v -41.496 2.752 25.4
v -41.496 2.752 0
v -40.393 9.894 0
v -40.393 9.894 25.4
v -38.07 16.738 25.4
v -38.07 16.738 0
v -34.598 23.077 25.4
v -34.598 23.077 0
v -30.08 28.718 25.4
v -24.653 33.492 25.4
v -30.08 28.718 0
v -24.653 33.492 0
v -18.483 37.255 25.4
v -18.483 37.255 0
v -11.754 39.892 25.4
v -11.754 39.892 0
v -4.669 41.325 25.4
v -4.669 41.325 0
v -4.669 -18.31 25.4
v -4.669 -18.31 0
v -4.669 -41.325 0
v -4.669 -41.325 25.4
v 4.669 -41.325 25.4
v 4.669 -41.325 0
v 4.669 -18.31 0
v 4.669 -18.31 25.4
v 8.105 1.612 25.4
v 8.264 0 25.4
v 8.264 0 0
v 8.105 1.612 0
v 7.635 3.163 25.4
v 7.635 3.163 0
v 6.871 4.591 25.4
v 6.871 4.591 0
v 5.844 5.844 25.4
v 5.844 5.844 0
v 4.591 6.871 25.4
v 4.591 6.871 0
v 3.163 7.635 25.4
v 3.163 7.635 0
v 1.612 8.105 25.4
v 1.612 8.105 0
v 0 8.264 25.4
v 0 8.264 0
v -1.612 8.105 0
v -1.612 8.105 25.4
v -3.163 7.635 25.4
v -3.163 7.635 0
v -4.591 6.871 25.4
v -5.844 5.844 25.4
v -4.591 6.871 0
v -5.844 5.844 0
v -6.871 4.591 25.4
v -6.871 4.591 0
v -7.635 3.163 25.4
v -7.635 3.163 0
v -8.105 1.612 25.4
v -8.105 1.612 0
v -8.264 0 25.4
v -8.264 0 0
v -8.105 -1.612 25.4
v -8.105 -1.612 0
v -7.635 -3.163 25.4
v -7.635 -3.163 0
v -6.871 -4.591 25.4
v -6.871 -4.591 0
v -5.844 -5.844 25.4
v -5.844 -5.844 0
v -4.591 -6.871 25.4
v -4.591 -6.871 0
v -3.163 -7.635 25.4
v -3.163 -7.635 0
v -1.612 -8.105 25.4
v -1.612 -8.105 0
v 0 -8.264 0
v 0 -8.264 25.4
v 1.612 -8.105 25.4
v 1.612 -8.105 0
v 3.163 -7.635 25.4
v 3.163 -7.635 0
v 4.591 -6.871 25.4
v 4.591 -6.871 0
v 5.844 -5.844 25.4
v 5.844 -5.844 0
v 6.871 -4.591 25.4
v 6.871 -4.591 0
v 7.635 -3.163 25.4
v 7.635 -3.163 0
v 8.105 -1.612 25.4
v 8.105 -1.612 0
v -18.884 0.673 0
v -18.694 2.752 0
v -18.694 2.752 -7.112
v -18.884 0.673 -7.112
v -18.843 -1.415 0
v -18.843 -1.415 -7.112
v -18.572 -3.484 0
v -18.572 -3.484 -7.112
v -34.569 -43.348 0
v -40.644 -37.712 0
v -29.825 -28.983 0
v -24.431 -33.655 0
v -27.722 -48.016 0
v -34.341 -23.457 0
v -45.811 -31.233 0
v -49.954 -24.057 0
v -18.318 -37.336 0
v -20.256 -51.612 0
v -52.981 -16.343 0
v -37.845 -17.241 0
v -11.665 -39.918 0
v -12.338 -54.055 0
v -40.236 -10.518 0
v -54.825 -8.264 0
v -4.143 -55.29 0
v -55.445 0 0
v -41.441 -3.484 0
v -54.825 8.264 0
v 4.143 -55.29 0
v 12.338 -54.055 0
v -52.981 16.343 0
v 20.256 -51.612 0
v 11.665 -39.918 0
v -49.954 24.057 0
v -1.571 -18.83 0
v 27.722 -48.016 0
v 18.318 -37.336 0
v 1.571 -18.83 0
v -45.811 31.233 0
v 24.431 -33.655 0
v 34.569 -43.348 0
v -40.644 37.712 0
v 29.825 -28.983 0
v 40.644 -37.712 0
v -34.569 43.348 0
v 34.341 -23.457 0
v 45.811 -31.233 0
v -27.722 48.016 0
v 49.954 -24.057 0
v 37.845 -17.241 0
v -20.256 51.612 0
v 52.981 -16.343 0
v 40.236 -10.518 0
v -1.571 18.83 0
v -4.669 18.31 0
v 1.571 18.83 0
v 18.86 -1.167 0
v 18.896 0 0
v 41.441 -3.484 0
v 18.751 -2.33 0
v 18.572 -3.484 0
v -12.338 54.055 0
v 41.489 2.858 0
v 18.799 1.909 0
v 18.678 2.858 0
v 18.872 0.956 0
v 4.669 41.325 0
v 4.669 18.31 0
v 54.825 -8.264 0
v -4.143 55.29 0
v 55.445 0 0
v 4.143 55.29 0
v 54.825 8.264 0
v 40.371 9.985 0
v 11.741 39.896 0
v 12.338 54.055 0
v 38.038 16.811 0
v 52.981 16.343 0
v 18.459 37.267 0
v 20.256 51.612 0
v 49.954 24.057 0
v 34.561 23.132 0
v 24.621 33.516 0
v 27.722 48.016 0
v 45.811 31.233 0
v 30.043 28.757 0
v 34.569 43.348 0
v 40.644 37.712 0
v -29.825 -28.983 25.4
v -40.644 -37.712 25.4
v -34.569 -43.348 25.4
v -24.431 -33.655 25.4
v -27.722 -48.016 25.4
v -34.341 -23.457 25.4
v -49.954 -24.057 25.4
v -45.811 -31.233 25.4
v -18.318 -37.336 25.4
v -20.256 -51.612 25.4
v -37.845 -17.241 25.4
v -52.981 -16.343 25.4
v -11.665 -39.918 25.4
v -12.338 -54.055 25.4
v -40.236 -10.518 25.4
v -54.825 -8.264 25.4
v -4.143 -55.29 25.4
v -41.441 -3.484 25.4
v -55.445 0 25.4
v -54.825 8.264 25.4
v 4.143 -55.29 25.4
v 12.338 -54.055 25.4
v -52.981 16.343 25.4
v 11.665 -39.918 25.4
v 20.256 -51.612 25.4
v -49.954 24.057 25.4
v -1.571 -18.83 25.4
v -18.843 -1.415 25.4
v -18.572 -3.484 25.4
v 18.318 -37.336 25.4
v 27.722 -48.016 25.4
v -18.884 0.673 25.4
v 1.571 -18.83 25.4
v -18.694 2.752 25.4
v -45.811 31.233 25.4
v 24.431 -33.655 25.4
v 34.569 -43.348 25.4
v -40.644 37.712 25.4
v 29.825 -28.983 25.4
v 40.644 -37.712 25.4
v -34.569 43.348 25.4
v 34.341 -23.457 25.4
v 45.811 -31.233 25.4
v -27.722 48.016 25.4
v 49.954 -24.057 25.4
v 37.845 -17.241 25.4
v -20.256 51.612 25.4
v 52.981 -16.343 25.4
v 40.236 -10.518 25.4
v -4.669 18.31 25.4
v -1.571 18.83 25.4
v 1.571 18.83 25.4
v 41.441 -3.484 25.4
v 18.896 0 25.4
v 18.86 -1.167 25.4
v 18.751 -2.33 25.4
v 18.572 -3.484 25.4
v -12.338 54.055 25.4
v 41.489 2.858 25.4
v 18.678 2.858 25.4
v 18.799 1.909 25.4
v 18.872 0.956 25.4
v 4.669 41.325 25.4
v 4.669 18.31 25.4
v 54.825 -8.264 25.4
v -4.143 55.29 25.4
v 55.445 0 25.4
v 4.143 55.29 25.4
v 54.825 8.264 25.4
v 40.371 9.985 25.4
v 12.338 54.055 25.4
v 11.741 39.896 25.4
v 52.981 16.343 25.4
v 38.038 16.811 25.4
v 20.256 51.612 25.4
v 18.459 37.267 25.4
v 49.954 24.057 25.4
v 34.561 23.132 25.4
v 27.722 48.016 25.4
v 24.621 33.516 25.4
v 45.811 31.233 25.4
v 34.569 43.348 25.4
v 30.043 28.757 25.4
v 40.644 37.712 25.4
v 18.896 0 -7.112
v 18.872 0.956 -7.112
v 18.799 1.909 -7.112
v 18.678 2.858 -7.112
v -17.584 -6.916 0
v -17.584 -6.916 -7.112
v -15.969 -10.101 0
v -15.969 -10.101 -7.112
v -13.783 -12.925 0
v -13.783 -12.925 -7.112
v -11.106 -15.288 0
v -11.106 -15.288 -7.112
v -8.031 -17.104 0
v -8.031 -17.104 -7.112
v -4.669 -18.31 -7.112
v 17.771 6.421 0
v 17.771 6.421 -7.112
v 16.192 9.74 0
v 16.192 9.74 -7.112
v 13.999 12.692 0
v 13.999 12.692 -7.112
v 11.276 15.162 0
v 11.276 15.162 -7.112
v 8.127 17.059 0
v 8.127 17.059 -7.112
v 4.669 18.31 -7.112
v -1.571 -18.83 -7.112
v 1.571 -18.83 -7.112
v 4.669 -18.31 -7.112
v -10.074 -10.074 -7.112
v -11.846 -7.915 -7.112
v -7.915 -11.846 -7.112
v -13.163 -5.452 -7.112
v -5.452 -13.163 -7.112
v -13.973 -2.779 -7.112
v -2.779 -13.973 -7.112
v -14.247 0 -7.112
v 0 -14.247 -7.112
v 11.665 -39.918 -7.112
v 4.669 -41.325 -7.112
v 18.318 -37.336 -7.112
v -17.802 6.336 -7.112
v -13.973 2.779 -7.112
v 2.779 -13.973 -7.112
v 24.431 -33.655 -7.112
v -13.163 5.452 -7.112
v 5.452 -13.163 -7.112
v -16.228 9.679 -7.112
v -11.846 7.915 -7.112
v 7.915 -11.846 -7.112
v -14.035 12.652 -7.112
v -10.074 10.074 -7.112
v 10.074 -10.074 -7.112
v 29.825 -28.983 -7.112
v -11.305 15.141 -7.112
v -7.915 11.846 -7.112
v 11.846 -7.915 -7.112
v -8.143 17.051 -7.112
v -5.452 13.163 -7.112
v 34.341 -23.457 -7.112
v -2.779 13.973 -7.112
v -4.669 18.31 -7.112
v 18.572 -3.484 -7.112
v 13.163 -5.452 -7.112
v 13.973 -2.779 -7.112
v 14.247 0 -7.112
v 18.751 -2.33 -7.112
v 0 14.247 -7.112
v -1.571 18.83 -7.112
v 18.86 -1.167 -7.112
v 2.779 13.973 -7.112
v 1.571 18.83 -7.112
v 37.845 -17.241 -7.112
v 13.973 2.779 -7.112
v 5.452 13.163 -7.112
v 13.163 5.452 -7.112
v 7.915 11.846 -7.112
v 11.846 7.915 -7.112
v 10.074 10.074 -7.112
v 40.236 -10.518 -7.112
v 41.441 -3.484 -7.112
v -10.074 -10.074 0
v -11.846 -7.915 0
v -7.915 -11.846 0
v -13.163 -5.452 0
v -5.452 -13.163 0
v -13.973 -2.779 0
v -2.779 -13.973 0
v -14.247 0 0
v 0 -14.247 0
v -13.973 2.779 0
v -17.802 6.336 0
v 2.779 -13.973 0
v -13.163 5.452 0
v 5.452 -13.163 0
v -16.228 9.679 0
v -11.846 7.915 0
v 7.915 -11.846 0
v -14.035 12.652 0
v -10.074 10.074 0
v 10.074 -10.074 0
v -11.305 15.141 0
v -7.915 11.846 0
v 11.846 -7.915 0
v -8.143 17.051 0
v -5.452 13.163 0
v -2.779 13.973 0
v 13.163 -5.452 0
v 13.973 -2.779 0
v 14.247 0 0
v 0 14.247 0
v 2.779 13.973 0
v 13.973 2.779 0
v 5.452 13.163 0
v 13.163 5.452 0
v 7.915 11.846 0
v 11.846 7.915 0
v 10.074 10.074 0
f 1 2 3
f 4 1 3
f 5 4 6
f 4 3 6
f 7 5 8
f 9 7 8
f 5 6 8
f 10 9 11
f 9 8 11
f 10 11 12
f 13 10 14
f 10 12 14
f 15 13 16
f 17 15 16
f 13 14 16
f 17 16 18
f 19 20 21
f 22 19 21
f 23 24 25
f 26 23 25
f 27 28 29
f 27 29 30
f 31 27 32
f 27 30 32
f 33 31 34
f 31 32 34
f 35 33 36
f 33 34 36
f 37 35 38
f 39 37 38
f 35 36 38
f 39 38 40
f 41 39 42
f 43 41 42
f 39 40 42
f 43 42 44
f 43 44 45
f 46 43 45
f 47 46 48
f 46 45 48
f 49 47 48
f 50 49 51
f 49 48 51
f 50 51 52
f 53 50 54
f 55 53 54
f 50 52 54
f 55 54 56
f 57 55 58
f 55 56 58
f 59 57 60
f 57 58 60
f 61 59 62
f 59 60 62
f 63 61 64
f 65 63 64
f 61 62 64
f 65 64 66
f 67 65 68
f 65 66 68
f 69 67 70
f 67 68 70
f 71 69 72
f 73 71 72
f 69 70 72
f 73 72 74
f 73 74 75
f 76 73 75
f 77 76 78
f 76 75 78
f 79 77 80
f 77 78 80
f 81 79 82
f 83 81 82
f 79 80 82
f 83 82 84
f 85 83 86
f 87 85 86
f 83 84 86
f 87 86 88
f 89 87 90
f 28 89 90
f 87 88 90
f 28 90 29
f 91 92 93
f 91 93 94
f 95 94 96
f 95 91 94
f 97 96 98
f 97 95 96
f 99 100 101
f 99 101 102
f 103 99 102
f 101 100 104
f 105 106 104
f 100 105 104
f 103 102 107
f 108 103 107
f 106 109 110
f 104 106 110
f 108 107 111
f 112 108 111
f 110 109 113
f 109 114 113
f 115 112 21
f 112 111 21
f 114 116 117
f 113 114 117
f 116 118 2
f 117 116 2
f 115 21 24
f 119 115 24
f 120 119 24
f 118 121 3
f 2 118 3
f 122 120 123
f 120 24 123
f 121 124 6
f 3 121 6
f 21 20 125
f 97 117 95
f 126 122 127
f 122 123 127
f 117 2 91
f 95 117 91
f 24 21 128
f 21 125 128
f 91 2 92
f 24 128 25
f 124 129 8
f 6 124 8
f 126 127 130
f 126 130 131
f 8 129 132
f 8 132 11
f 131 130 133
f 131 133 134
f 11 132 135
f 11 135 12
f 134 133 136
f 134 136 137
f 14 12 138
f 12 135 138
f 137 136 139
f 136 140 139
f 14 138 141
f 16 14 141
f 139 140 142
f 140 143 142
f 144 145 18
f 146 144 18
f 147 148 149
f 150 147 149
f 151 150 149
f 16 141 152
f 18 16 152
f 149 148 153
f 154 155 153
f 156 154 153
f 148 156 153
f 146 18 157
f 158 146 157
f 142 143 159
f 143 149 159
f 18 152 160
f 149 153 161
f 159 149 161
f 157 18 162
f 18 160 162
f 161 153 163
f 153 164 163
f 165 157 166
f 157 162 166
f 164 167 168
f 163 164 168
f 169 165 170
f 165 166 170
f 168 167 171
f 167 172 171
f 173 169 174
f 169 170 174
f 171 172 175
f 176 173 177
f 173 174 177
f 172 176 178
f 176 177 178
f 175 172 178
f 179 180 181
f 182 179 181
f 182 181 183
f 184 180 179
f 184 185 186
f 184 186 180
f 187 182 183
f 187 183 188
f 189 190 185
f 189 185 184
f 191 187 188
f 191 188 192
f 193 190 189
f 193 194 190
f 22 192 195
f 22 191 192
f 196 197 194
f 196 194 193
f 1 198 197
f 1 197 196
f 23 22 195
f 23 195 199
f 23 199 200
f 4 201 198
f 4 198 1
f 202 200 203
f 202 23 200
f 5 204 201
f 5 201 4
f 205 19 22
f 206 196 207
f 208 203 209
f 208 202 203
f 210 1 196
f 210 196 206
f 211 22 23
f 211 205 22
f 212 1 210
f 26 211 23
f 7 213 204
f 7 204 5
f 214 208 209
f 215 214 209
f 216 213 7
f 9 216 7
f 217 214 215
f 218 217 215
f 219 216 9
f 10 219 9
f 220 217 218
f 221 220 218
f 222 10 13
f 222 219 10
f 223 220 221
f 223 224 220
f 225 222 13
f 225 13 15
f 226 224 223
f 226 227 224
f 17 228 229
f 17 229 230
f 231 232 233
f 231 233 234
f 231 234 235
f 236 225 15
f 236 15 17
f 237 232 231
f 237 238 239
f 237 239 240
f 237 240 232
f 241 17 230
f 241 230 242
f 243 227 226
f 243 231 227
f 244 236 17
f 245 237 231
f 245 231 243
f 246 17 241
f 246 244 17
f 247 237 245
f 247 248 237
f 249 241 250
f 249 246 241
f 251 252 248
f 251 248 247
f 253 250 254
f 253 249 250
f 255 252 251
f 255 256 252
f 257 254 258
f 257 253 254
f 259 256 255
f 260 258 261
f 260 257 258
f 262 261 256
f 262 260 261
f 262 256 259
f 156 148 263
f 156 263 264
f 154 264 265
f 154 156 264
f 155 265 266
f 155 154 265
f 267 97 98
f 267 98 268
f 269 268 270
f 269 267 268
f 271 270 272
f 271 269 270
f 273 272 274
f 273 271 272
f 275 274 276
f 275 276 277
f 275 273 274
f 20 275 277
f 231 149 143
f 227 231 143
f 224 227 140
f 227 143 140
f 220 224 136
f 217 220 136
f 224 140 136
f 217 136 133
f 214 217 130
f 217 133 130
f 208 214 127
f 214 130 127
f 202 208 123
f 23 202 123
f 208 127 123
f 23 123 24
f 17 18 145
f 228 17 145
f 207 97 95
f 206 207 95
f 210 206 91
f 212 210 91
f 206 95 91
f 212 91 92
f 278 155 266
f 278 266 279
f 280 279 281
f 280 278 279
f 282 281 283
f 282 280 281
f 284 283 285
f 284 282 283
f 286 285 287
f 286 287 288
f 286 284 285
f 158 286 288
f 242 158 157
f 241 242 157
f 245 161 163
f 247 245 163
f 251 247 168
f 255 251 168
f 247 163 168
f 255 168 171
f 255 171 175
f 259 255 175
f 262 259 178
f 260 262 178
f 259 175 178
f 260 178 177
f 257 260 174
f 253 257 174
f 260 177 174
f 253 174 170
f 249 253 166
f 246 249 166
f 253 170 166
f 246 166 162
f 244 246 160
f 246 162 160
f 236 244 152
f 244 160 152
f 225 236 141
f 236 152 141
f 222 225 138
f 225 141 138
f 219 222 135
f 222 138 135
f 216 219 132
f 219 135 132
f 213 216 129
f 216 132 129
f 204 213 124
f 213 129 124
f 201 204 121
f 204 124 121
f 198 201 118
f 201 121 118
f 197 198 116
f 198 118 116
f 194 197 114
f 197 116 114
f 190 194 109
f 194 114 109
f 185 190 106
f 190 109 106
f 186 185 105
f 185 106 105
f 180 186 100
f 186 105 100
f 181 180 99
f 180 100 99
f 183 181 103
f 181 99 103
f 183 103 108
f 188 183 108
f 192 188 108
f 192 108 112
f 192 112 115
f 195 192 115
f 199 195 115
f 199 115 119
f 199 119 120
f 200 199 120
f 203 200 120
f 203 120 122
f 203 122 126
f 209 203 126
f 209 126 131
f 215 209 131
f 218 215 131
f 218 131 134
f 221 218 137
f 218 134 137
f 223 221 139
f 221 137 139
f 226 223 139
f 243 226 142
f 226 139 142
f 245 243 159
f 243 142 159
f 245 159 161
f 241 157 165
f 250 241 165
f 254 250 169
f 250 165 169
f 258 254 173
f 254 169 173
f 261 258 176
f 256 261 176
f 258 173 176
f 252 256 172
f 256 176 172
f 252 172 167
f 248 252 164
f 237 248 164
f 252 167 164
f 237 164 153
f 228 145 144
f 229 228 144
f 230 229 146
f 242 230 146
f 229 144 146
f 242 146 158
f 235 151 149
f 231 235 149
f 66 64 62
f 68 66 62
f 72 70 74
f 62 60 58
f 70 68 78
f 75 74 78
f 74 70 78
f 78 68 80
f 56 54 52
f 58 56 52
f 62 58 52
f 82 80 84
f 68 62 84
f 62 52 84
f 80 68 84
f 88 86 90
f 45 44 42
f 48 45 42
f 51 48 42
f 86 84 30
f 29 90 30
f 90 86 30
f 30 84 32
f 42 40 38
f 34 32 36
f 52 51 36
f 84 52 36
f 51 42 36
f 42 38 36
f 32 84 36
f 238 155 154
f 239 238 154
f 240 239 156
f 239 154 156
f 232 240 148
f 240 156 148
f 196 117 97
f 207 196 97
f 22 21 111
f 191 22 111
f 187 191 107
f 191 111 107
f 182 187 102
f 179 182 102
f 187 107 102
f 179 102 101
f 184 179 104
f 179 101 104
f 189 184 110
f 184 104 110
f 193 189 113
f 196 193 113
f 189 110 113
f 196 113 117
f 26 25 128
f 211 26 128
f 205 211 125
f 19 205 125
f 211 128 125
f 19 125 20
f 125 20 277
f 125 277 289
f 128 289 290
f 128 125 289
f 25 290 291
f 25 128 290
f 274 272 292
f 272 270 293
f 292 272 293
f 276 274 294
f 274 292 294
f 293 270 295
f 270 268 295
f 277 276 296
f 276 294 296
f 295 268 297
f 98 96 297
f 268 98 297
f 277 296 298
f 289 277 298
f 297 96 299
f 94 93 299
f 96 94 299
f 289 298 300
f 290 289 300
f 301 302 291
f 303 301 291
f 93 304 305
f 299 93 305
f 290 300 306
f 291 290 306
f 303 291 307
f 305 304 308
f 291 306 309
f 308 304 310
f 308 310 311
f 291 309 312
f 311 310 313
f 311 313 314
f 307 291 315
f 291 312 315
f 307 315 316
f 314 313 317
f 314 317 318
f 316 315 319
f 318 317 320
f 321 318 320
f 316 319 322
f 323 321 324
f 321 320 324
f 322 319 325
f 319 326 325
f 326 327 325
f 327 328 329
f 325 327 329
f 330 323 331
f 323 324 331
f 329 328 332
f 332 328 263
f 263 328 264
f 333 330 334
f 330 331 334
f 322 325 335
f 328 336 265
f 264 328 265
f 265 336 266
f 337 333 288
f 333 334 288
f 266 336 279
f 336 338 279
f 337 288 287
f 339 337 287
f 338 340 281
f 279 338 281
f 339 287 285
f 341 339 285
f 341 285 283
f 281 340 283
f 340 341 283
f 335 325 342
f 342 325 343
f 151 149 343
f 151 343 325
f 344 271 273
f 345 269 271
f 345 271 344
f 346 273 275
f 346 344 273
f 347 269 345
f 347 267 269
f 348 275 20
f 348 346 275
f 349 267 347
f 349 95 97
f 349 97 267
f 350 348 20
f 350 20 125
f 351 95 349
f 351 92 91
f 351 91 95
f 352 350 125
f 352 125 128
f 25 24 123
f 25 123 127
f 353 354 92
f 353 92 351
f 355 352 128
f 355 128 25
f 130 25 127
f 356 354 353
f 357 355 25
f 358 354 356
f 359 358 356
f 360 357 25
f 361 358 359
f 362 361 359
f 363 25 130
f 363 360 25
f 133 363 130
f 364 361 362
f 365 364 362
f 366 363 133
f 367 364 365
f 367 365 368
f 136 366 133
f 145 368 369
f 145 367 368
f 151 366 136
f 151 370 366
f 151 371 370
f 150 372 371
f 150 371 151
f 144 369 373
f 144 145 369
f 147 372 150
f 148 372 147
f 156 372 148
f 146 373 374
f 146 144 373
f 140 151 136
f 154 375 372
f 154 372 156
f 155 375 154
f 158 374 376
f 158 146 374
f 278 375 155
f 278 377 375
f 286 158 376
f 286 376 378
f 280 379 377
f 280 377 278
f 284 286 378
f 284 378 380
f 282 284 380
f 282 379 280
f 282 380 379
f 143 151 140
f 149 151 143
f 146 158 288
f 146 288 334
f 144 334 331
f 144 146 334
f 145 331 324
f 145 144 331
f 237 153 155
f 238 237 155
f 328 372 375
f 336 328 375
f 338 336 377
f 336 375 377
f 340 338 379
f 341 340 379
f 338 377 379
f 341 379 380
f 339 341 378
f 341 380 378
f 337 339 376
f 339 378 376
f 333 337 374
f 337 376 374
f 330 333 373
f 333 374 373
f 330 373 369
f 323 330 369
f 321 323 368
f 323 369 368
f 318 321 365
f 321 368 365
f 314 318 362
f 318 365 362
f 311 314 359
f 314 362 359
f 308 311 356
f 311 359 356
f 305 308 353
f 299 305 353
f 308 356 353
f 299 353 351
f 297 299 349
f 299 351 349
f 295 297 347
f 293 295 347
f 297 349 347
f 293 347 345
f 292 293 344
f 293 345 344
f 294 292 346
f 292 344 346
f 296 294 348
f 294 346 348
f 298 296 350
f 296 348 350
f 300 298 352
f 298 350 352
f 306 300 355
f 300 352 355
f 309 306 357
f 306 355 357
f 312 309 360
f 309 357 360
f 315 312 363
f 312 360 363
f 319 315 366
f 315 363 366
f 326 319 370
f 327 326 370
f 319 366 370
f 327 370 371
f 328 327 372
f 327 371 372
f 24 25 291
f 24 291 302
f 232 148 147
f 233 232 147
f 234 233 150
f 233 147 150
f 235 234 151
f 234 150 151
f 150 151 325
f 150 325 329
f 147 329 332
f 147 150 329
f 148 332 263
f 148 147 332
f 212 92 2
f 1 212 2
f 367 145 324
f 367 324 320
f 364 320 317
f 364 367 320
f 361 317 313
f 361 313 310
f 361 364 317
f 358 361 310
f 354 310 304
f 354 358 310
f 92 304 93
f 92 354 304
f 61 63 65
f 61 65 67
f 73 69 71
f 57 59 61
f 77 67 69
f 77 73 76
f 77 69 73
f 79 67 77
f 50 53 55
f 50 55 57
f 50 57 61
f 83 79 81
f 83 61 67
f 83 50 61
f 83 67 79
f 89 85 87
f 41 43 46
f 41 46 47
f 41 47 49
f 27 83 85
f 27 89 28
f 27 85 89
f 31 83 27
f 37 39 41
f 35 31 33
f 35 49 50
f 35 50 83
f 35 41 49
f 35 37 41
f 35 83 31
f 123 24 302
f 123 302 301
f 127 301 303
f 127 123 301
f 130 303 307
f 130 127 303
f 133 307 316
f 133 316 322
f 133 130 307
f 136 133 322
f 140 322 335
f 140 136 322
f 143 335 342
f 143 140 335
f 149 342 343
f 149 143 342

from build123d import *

# Parameters (mm, degrees)
F0_R     = 55.4446440976
F1_DEPTH = 25.4
F2_DEPTH = 25.4
F0_R_2   = 14.2471113664
F3_DEPTH = 7.112
F0_R_3   = 8.2640856971
F4_DEPTH = 25.4


# Not quite as in the source:
# - a feature names something its author has since deleted; it is built from what else it names


with BuildPart() as f1:
    # F0 (on Top) → F1 (new body)
    with BuildSketch(Plane.XY):
        Circle(F0_R)
        with BuildLine():
            ThreePointArc((4.6694431101, 41.3246424597), (30.0430645384, 28.7566348262), (41.4893209282, 2.8576252906))
            ThreePointArc((41.4893209282, 2.8576252906), (41.5630346864, 1.4296576644), (41.5876156251, 0))
            ThreePointArc((41.5876156251, 0), (41.551042786, -1.743736442), (41.4413885942, -3.4844059424))
            ThreePointArc((41.4413885942, -3.4844059424), (29.8248734287, -28.9828690496), (4.6694431101, -41.3246424597))
            ThreePointArc((4.6694431101, -41.3246424597), (0, -41.5876156251), (-4.6694431101, -41.3246424597))
            ThreePointArc((-4.6694431101, -41.3246424597), (-29.8248734287, -28.9828690496), (-41.4413885942, -3.4844059424))
            ThreePointArc((-41.4413885942, -3.4844059424), (-41.5859924727, -0.3674281517), (-41.496486252, 2.7516180913))
            ThreePointArc((-41.496486252, 2.7516180913), (-30.0797741132, 28.7182339757), (-4.6694431101, 41.3246424597))
            ThreePointArc((-4.6694431101, 41.3246424597), (0, 41.5876156251), (4.6694431101, 41.3246424597))
        make_face(mode=Mode.SUBTRACT)
    extrude(amount=F1_DEPTH)

    # F0 (on Top) → F2 (join)
    with BuildSketch(Plane.XY):
        Circle(F0_R)
        with BuildLine():
            ThreePointArc((4.6694431101, 41.3246424597), (30.0430645384, 28.7566348262), (41.4893209282, 2.8576252906))
            ThreePointArc((41.4893209282, 2.8576252906), (41.5630346864, 1.4296576644), (41.5876156251, 0))
            ThreePointArc((41.5876156251, 0), (41.551042786, -1.743736442), (41.4413885942, -3.4844059424))
            ThreePointArc((41.4413885942, -3.4844059424), (29.8248734287, -28.9828690496), (4.6694431101, -41.3246424597))
            ThreePointArc((4.6694431101, -41.3246424597), (0, -41.5876156251), (-4.6694431101, -41.3246424597))
            ThreePointArc((-4.6694431101, -41.3246424597), (-29.8248734287, -28.9828690496), (-41.4413885942, -3.4844059424))
            ThreePointArc((-41.4413885942, -3.4844059424), (-41.5859924727, -0.3674281517), (-41.496486252, 2.7516180913))
            ThreePointArc((-41.496486252, 2.7516180913), (-30.0797741132, 28.7182339757), (-4.6694431101, 41.3246424597))
            ThreePointArc((-4.6694431101, 41.3246424597), (0, 41.5876156251), (4.6694431101, 41.3246424597))
        make_face(mode=Mode.SUBTRACT)
        with BuildLine():
            ThreePointArc((-4.6694431101, 18.3096772012), (0, 18.895713222), (4.6694431101, 18.3096772012))
            Line((4.6694431101, 18.3096772012), (4.6694431101, 41.3246424597))
            ThreePointArc((4.6694431101, 41.3246424597), (0, 41.5876156251), (-4.6694431101, 41.3246424597))
            Line((-4.6694431101, 41.3246424597), (-4.6694431101, 18.3096772012))
        make_face()
        with BuildLine():
            ThreePointArc((-18.5716691064, -3.4844059424), (-18.8920611509, -0.3714884108), (-18.6942926063, 2.7516180913))
            Line((-18.6942926063, 2.7516180913), (-41.496486252, 2.7516180913))
            ThreePointArc((-41.496486252, 2.7516180913), (-41.5859924727, -0.3674281517), (-41.4413885942, -3.4844059424))
            Line((-41.4413885942, -3.4844059424), (-18.5716691064, -3.4844059424))
        make_face()
        with BuildLine():
            Line((4.6694431101, -41.3246424597), (4.6694431101, -18.3096772012))
            ThreePointArc((4.6694431101, -18.3096772012), (0, -18.895713222), (-4.6694431101, -18.3096772012))
            Line((-4.6694431101, -18.3096772012), (-4.6694431101, -41.3246424597))
            ThreePointArc((-4.6694431101, -41.3246424597), (0, -41.5876156251), (4.6694431101, -41.3246424597))
        make_face()
        with BuildLine():
            ThreePointArc((18.6783820463, 2.8576252906), (18.8413020883, 1.4329388631), (18.895713222, 0))
            ThreePointArc((18.895713222, 0), (18.8145277865, -1.7497206463), (18.5716691064, -3.4844059424))
            Line((18.5716691064, -3.4844059424), (41.4413885942, -3.4844059424))
            ThreePointArc((41.4413885942, -3.4844059424), (41.551042786, -1.743736442), (41.5876156251, 0))
            ThreePointArc((41.5876156251, 0), (41.5630346864, 1.4296576644), (41.4893209282, 2.8576252906))
            Line((41.4893209282, 2.8576252906), (18.6783820463, 2.8576252906))
        make_face()
    extrude(amount=F2_DEPTH)


with BuildPart() as f3:
    # F0 (on Top) → F3 (new body)
    with BuildSketch(Plane.XY):
        with BuildLine():
            Line((41.4413885942, -3.4844059424), (18.5716691064, -3.4844059424))
            ThreePointArc((18.5716691064, -3.4844059424), (13.7834861787, -12.925304133), (4.6694431101, -18.3096772012))
            Line((4.6694431101, -18.3096772012), (4.6694431101, -41.3246424597))
            ThreePointArc((4.6694431101, -41.3246424597), (29.8248734287, -28.9828690496), (41.4413885942, -3.4844059424))
        make_face()
        with BuildLine():
            ThreePointArc((18.5716691064, -3.4844059424), (18.8145277865, -1.7497206463), (18.895713222, 0))
            ThreePointArc((18.895713222, 0), (18.8413020883, 1.4329388631), (18.6783820463, 2.8576252906))
            ThreePointArc((18.6783820463, 2.8576252906), (13.9989896759, 12.6915824949), (4.6694431101, 18.3096772012))
            ThreePointArc((4.6694431101, 18.3096772012), (0, 18.895713222), (-4.6694431101, 18.3096772012))
            ThreePointArc((-4.6694431101, 18.3096772012), (-14.0349327563, 12.6518236115), (-18.6942926063, 2.7516180913))
            ThreePointArc((-18.6942926063, 2.7516180913), (-18.8920611509, -0.3714884108), (-18.5716691064, -3.4844059424))
            ThreePointArc((-18.5716691064, -3.4844059424), (-13.7834861787, -12.925304133), (-4.6694431101, -18.3096772012))
            ThreePointArc((-4.6694431101, -18.3096772012), (0, -18.895713222), (4.6694431101, -18.3096772012))
            ThreePointArc((4.6694431101, -18.3096772012), (13.7834861787, -12.925304133), (18.5716691064, -3.4844059424))
        make_face()
        Circle(F0_R_2, mode=Mode.SUBTRACT)
    extrude(amount=-F3_DEPTH)


with BuildPart() as f4:
    # F0 (on Top) → F4 (new body)
    with BuildSketch(Plane.XY):
        Circle(F0_R_3)
    extrude(amount=F4_DEPTH)


solid = Compound([f1.part, f3.part, f4.part])
